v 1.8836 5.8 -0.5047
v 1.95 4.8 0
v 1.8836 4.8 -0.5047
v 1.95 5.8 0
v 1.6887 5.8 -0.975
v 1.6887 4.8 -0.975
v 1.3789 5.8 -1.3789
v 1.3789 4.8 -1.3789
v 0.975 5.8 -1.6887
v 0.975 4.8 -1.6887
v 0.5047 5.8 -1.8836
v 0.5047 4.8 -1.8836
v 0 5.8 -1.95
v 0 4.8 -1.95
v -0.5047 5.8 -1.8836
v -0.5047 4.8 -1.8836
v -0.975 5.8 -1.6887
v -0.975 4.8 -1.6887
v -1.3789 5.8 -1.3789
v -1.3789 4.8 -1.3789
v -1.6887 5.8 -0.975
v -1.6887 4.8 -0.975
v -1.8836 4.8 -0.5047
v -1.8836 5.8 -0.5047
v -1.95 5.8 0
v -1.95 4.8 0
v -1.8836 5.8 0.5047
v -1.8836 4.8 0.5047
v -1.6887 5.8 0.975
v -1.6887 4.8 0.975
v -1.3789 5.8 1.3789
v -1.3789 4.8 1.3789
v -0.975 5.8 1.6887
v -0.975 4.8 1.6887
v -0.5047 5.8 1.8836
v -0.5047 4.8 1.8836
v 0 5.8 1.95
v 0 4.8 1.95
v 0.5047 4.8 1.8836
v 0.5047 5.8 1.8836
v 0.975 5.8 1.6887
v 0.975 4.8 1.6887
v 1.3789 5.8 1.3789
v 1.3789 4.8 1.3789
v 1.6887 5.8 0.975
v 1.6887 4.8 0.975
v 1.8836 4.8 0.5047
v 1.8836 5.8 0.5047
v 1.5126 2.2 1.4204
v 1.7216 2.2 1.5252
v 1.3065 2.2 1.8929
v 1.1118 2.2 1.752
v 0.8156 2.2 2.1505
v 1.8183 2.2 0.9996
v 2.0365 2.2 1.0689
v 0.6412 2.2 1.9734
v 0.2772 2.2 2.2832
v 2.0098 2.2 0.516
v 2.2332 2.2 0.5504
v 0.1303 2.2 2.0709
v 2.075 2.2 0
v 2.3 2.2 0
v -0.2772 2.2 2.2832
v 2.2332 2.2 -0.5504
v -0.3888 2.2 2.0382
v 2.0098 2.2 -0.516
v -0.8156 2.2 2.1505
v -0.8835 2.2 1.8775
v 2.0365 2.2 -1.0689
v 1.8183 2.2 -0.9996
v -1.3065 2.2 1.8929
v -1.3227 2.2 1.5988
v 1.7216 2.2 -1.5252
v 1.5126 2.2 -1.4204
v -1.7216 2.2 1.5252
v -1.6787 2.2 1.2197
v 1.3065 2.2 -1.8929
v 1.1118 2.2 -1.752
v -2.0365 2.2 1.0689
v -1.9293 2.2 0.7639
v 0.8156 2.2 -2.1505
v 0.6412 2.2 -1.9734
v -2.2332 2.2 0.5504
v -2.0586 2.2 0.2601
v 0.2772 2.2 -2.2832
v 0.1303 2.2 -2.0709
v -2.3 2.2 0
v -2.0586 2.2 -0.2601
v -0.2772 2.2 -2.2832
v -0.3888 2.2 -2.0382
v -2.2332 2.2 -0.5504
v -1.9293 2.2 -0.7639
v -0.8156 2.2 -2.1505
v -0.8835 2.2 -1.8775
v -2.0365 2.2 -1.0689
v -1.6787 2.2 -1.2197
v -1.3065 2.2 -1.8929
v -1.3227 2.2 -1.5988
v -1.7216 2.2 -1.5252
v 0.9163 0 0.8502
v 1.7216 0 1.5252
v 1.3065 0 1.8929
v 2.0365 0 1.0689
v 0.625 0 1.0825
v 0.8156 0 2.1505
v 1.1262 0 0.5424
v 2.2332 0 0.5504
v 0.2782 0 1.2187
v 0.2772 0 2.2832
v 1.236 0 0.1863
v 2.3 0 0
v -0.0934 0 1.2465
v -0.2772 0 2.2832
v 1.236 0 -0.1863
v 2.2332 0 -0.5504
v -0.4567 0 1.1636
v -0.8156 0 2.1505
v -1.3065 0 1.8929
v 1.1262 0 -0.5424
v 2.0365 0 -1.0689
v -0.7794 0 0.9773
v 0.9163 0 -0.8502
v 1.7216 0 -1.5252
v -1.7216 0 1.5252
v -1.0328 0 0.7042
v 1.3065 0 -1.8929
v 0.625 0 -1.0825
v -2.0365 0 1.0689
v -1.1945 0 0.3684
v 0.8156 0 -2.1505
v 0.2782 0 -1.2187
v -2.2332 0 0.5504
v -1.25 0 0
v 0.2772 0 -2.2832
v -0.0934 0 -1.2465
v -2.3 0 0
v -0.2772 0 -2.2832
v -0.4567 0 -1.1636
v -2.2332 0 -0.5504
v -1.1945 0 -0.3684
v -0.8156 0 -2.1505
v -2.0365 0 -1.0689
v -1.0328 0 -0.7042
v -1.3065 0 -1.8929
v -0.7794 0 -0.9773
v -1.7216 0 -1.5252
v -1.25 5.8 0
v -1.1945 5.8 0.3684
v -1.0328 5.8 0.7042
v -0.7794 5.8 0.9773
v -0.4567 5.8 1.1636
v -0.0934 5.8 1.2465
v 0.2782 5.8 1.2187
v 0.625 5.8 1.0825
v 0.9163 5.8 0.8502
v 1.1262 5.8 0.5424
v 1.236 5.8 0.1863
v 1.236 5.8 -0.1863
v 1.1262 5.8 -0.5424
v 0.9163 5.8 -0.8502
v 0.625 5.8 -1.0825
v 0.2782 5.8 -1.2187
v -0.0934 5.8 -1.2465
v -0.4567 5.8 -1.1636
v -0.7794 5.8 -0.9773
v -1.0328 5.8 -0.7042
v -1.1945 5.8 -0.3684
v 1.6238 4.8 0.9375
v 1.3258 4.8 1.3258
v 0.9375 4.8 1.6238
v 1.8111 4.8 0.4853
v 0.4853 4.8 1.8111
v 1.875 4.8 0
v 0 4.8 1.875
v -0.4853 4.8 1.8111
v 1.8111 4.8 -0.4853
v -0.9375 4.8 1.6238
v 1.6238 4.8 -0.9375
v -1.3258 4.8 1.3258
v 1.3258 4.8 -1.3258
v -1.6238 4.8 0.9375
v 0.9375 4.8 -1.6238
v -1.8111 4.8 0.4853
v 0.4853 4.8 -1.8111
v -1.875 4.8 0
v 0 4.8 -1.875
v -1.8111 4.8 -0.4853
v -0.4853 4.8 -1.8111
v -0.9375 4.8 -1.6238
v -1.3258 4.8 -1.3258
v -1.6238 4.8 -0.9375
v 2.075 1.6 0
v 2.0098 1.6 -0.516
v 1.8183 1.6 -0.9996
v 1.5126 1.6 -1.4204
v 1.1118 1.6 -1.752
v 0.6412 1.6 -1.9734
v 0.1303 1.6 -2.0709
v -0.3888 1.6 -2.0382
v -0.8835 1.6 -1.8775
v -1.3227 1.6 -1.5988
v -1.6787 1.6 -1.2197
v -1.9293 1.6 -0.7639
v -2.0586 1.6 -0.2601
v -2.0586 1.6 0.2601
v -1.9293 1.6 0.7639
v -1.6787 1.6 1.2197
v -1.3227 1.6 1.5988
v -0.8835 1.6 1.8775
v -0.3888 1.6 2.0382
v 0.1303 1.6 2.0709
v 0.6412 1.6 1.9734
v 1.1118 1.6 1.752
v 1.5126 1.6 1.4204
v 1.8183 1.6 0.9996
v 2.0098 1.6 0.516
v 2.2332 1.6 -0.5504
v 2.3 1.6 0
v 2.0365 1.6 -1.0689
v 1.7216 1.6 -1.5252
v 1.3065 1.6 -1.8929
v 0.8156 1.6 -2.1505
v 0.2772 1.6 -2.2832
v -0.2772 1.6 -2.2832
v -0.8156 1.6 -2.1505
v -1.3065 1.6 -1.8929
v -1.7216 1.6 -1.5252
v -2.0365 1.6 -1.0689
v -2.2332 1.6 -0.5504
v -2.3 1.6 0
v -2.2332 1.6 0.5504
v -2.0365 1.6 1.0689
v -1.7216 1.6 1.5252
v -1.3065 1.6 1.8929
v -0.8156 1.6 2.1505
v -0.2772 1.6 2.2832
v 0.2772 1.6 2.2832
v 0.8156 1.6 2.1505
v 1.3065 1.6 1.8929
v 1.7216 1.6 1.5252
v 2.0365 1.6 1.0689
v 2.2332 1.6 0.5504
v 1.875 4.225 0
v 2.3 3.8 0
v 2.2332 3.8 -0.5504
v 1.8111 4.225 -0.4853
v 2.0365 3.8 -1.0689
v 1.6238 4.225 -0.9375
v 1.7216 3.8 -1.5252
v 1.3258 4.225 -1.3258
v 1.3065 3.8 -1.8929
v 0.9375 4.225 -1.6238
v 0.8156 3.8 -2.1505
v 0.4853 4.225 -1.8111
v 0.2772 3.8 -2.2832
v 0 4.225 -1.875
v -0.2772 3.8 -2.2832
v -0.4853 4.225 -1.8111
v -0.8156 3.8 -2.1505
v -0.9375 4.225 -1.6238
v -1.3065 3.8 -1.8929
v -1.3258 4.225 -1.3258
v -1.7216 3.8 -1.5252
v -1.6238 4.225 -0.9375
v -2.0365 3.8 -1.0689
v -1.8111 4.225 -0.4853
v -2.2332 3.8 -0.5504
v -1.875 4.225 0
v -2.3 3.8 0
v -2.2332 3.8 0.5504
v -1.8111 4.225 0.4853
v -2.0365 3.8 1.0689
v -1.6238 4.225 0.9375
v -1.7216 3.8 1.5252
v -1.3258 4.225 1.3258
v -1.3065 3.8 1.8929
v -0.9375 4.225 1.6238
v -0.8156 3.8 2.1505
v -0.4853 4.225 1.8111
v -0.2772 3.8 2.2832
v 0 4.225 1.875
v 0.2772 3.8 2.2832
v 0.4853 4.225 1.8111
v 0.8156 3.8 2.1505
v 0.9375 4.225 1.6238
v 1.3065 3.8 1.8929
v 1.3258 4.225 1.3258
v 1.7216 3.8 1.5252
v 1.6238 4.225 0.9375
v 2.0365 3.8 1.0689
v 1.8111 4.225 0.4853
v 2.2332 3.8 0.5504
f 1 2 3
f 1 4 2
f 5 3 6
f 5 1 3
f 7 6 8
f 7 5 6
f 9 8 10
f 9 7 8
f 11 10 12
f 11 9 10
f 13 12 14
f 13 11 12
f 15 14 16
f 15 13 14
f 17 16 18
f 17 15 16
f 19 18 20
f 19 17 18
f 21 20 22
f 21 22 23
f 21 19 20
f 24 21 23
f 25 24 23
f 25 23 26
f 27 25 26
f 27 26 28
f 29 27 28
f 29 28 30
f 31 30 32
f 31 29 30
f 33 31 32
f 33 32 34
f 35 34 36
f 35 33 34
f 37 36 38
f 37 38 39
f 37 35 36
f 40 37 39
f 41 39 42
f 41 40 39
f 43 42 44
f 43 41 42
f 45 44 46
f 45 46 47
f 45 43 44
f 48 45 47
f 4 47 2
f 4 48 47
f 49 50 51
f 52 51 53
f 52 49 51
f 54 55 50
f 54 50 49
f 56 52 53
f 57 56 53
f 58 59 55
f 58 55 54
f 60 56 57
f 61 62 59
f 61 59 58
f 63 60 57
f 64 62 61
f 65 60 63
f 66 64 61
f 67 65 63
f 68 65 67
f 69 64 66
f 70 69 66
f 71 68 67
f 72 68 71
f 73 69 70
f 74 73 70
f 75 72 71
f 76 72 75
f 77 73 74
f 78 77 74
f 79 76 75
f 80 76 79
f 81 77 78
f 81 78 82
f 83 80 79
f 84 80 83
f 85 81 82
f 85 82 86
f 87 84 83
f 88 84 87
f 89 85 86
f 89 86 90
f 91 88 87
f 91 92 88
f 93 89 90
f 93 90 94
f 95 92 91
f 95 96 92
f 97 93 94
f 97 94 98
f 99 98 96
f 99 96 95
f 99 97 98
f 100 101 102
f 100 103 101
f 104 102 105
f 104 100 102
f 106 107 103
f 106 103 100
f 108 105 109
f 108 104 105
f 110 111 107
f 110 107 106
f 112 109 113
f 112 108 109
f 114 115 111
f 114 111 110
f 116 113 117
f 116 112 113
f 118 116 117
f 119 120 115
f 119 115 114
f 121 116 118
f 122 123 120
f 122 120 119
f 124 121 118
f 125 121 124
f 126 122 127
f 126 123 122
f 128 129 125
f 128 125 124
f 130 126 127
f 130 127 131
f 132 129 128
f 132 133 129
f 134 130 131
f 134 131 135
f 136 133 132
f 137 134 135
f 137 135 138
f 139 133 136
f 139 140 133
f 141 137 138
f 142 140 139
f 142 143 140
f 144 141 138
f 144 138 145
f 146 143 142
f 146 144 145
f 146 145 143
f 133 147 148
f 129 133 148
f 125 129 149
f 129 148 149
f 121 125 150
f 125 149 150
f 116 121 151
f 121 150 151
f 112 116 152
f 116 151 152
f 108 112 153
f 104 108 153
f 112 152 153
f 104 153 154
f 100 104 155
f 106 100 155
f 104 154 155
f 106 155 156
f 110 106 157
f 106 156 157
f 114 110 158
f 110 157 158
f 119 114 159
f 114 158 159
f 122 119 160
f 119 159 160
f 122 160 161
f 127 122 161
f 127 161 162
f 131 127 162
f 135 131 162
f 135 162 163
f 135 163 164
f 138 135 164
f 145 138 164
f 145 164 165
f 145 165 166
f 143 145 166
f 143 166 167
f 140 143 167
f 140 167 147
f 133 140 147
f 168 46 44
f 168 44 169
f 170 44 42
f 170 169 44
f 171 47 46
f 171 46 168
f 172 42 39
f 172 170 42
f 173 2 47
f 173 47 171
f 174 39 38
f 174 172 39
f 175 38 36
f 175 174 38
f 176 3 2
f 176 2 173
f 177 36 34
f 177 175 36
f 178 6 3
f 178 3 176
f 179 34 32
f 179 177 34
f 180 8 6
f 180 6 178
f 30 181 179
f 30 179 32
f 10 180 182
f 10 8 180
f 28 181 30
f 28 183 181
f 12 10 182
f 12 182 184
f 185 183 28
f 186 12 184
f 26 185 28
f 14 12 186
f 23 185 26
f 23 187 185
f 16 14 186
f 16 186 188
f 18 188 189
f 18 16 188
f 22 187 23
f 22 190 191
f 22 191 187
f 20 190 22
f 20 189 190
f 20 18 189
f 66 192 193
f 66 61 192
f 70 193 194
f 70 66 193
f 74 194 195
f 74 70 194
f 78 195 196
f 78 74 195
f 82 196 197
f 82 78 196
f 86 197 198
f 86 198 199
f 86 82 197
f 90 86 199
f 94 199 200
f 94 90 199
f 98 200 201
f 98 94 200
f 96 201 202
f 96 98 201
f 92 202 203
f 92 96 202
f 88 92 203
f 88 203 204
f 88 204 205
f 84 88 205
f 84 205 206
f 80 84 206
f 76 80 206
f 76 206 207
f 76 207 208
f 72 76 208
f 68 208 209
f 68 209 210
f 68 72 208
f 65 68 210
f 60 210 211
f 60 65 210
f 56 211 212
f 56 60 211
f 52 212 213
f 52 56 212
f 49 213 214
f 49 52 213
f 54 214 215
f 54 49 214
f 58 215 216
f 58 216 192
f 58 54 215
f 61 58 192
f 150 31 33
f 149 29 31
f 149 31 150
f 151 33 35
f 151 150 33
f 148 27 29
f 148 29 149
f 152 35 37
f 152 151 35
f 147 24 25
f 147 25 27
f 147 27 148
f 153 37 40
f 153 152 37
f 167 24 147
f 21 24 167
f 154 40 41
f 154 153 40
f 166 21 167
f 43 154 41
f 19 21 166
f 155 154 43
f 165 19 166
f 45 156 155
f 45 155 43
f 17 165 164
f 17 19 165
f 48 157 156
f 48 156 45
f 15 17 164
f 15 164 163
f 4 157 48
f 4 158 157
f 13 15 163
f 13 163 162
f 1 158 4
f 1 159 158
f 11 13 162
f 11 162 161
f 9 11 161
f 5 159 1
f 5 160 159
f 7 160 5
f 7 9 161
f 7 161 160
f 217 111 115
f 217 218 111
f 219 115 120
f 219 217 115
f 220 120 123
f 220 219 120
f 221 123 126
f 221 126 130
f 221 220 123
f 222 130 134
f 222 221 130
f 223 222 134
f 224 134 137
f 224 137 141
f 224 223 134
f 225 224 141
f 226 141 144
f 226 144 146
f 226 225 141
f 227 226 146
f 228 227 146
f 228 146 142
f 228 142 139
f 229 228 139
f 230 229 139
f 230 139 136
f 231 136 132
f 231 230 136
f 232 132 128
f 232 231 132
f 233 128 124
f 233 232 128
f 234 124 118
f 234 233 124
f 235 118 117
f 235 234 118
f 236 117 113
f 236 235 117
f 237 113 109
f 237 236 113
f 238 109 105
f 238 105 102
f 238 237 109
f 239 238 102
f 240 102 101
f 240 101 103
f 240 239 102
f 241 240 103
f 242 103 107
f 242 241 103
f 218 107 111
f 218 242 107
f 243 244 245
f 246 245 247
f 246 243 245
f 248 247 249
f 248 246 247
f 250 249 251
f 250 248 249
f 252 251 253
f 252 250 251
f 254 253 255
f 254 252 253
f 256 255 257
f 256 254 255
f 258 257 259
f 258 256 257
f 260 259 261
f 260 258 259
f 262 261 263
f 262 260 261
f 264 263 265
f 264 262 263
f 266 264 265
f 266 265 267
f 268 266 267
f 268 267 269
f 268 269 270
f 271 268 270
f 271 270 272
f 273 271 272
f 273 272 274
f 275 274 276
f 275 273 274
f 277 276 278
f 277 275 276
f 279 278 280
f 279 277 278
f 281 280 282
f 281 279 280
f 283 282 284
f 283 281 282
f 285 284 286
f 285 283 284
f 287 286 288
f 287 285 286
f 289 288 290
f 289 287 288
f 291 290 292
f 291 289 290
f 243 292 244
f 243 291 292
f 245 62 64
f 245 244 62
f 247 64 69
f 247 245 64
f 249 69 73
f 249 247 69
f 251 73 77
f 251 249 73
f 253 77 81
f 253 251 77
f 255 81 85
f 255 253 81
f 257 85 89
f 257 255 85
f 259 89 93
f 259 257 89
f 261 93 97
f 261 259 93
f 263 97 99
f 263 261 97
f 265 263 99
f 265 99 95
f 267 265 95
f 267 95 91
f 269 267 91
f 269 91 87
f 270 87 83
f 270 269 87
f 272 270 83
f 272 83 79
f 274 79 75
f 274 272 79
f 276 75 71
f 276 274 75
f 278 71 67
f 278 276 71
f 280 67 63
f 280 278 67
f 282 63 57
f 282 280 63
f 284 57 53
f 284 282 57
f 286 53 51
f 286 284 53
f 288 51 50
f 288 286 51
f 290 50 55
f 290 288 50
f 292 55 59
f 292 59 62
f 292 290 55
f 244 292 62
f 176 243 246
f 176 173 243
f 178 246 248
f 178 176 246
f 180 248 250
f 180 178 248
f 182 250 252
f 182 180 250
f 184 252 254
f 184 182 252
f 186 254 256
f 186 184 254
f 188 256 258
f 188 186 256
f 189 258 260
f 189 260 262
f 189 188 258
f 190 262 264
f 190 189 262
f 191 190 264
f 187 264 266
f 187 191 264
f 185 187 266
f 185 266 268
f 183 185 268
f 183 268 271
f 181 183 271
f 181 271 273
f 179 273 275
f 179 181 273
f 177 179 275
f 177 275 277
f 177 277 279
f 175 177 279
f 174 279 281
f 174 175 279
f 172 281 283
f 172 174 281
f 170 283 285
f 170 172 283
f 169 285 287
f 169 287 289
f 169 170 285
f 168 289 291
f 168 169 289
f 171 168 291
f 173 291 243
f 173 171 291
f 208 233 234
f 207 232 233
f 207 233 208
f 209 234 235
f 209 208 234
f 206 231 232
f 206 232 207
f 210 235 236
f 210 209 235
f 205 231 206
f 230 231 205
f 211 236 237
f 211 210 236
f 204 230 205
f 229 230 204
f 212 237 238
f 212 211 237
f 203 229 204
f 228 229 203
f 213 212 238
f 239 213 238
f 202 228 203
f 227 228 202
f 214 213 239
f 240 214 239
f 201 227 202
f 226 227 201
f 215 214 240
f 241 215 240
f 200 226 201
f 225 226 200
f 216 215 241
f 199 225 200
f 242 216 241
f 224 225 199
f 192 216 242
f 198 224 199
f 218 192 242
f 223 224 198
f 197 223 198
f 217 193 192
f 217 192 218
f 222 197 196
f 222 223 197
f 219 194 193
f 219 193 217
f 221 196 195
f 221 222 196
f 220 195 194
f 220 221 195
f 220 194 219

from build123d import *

# Parameters (mm, degrees)
SKETCH2_R          = 1.25
CUT_EXTRUDE1_DEPTH = 7.649812027


with BuildPart() as part:
    # Sketch1 → Revolve1 (revolve)
    with BuildSketch(Plane.XY, mode=Mode.PRIVATE) as revolve1_sk:
        Polygon((0, 0), (-2.3, 0), (-2.3, 1.6), (-2.075, 1.6), (-2.075, 2.2), (-2.3, 2.2), (-2.3, 3.8), (-1.875, 4.225), (-1.875, 4.8), (-1.95, 4.8), (-1.95, 5.8), (0, 5.8), align=None)
    revolve(revolve1_sk.sketch.rotate(Axis((0, -65.63361976, 0), (0, 1, 0)), 180), axis=Axis((0, -65.63361976, 0), (0, 1, 0)))

    # Sketch2 → Cut-Extrude1 (cut, through all)
    with BuildSketch(Plane(origin=(0, 5.8, 0), x_dir=(1, 0, 0), z_dir=(0, 1, 0))):
        with Locations(Location((0, 0, 0), (0, 0, 180))):
            Circle(SKETCH2_R)
    extrude(amount=-CUT_EXTRUDE1_DEPTH, mode=Mode.SUBTRACT)


solid = part.part
